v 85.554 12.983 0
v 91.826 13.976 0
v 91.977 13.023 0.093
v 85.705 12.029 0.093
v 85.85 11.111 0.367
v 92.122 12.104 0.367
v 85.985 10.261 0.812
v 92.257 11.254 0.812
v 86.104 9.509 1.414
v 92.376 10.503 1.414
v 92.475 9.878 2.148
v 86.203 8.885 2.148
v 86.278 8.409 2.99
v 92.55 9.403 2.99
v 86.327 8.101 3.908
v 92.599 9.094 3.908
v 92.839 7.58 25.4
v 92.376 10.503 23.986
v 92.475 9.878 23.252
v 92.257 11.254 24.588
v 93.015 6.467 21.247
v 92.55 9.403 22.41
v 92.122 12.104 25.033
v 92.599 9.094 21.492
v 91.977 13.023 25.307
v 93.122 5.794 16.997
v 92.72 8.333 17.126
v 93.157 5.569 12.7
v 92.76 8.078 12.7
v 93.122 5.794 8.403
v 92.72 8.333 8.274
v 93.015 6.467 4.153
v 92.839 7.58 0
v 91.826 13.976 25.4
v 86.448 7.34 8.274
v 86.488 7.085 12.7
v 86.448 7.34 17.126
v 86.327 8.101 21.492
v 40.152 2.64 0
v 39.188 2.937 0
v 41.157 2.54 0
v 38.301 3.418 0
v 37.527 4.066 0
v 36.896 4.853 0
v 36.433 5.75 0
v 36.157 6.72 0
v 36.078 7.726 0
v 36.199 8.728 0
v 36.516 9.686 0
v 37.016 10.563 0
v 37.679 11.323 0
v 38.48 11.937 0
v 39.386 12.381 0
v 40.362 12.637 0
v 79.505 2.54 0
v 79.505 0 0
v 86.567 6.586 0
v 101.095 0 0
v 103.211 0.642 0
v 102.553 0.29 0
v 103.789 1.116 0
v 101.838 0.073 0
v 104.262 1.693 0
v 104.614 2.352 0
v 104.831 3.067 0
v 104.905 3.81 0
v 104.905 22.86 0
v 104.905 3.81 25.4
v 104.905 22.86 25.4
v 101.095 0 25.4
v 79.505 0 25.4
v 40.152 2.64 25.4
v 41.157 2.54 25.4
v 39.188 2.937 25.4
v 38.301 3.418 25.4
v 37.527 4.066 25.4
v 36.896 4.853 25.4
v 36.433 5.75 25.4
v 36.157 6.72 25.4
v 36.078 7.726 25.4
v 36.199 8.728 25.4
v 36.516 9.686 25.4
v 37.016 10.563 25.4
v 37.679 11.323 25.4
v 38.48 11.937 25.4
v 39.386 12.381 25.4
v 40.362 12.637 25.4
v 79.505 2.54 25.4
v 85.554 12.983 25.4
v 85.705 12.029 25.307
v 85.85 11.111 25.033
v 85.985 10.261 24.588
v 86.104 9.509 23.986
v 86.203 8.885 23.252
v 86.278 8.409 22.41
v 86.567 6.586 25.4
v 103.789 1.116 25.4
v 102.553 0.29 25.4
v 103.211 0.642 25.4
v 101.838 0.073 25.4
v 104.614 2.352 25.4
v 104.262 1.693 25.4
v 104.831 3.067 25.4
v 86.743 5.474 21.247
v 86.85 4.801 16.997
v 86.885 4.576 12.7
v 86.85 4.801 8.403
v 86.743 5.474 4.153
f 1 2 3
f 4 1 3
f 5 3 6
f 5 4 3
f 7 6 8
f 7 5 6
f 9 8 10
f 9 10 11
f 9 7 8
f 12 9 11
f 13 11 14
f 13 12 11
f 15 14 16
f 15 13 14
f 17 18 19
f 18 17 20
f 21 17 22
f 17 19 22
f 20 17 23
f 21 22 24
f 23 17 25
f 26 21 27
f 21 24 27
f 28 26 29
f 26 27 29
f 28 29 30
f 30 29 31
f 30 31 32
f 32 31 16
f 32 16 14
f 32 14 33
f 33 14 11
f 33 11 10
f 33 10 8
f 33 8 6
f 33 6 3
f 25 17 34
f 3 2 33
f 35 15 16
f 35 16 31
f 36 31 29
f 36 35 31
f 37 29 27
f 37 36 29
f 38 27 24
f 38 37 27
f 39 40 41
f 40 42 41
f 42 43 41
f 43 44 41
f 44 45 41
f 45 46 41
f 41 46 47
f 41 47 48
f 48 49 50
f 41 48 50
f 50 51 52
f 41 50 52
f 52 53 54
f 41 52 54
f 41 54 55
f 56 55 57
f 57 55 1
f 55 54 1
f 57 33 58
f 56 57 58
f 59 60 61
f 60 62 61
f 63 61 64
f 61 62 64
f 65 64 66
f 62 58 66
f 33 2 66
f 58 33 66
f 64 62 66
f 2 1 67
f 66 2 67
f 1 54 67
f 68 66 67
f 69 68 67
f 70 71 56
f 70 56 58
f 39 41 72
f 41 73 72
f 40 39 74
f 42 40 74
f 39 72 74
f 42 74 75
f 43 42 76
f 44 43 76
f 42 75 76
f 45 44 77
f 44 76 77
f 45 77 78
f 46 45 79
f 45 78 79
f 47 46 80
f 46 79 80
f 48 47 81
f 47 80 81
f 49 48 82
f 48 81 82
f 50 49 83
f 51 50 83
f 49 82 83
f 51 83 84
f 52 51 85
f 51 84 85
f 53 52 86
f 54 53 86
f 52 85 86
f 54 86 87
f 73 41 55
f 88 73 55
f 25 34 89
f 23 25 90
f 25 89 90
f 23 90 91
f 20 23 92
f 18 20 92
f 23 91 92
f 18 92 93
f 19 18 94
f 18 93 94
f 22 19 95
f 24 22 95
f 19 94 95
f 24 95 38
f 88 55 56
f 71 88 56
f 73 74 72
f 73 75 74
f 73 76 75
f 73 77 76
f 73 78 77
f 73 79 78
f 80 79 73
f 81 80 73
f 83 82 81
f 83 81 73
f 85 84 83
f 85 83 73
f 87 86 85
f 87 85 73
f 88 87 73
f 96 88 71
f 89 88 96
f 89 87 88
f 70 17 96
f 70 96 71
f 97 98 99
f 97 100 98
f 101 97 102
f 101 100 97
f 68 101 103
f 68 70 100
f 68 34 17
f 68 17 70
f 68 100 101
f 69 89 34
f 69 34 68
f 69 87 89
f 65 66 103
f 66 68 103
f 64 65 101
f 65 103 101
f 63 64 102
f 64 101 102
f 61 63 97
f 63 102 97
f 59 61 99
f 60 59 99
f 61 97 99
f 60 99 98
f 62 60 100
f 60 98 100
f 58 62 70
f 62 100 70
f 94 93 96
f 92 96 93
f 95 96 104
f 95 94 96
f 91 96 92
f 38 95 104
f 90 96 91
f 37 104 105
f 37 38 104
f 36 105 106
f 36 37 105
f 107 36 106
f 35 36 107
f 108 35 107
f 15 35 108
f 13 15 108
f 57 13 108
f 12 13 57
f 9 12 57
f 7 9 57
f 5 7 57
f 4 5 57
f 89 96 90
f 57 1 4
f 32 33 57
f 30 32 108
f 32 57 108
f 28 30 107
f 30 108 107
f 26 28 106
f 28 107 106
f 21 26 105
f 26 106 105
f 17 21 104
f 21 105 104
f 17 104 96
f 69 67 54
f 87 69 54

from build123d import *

# Parameters (mm, degrees)
F1_DEPTH = 25.4
F2_R     = 3.81
F5_W     = 6.35
F5_H     = 2.54
F7_R     = 5.08
F8_R     = 5.08


with BuildPart() as f1:
    # F0 (on Top) → F1 (new body)
    with BuildSketch(Plane.XY):
        Polygon((104.9045048051, 0), (104.9045048051, 2.54), (104.9045048051, 22.86), (-23.3909259731, 2.54), (79.5045048051, 2.54), (79.5045048051, 0), align=None)
    extrude(amount=F1_DEPTH)

    # F2
    f2_edges = [f1.edges().sort_by_distance(p)[0] for p in [
        (104.904505, 0, 12.7),
    ]]
    fillet(f2_edges, radius=F2_R)

    # F5 (on offset) → F6 (revolve, cut)
    with BuildSketch(Plane(origin=(-4.938303697, 31.1792224467, 0), x_dir=(-0.9876883406, -0.156434465, 0), z_dir=(-0.156434465, 0.9876883406, 0))):
        with Locations((-89.706552875, 52.07)):
            Rectangle(F5_W, F5_H)
    revolve(axis=Axis((58.4876587146, 41.2249080053, 12.7), (-0.9876883406, -0.156434465, 0)), mode=Mode.SUBTRACT)

    # F7
    f7_edges = [f1.edges().sort_by_distance(p)[0] for p in [
        (89.283099, 9.733642, 25.4),
        (89.283099, 9.733642, 0),
    ]]
    fillet(f7_edges, radius=F7_R)

    # F8
    f8_edges = [f1.edges().sort_by_distance(p)[0] for p in [
        (-23.390926, 2.54, 12.7),
    ]]
    fillet(f8_edges, radius=F8_R)


solid = f1.part
